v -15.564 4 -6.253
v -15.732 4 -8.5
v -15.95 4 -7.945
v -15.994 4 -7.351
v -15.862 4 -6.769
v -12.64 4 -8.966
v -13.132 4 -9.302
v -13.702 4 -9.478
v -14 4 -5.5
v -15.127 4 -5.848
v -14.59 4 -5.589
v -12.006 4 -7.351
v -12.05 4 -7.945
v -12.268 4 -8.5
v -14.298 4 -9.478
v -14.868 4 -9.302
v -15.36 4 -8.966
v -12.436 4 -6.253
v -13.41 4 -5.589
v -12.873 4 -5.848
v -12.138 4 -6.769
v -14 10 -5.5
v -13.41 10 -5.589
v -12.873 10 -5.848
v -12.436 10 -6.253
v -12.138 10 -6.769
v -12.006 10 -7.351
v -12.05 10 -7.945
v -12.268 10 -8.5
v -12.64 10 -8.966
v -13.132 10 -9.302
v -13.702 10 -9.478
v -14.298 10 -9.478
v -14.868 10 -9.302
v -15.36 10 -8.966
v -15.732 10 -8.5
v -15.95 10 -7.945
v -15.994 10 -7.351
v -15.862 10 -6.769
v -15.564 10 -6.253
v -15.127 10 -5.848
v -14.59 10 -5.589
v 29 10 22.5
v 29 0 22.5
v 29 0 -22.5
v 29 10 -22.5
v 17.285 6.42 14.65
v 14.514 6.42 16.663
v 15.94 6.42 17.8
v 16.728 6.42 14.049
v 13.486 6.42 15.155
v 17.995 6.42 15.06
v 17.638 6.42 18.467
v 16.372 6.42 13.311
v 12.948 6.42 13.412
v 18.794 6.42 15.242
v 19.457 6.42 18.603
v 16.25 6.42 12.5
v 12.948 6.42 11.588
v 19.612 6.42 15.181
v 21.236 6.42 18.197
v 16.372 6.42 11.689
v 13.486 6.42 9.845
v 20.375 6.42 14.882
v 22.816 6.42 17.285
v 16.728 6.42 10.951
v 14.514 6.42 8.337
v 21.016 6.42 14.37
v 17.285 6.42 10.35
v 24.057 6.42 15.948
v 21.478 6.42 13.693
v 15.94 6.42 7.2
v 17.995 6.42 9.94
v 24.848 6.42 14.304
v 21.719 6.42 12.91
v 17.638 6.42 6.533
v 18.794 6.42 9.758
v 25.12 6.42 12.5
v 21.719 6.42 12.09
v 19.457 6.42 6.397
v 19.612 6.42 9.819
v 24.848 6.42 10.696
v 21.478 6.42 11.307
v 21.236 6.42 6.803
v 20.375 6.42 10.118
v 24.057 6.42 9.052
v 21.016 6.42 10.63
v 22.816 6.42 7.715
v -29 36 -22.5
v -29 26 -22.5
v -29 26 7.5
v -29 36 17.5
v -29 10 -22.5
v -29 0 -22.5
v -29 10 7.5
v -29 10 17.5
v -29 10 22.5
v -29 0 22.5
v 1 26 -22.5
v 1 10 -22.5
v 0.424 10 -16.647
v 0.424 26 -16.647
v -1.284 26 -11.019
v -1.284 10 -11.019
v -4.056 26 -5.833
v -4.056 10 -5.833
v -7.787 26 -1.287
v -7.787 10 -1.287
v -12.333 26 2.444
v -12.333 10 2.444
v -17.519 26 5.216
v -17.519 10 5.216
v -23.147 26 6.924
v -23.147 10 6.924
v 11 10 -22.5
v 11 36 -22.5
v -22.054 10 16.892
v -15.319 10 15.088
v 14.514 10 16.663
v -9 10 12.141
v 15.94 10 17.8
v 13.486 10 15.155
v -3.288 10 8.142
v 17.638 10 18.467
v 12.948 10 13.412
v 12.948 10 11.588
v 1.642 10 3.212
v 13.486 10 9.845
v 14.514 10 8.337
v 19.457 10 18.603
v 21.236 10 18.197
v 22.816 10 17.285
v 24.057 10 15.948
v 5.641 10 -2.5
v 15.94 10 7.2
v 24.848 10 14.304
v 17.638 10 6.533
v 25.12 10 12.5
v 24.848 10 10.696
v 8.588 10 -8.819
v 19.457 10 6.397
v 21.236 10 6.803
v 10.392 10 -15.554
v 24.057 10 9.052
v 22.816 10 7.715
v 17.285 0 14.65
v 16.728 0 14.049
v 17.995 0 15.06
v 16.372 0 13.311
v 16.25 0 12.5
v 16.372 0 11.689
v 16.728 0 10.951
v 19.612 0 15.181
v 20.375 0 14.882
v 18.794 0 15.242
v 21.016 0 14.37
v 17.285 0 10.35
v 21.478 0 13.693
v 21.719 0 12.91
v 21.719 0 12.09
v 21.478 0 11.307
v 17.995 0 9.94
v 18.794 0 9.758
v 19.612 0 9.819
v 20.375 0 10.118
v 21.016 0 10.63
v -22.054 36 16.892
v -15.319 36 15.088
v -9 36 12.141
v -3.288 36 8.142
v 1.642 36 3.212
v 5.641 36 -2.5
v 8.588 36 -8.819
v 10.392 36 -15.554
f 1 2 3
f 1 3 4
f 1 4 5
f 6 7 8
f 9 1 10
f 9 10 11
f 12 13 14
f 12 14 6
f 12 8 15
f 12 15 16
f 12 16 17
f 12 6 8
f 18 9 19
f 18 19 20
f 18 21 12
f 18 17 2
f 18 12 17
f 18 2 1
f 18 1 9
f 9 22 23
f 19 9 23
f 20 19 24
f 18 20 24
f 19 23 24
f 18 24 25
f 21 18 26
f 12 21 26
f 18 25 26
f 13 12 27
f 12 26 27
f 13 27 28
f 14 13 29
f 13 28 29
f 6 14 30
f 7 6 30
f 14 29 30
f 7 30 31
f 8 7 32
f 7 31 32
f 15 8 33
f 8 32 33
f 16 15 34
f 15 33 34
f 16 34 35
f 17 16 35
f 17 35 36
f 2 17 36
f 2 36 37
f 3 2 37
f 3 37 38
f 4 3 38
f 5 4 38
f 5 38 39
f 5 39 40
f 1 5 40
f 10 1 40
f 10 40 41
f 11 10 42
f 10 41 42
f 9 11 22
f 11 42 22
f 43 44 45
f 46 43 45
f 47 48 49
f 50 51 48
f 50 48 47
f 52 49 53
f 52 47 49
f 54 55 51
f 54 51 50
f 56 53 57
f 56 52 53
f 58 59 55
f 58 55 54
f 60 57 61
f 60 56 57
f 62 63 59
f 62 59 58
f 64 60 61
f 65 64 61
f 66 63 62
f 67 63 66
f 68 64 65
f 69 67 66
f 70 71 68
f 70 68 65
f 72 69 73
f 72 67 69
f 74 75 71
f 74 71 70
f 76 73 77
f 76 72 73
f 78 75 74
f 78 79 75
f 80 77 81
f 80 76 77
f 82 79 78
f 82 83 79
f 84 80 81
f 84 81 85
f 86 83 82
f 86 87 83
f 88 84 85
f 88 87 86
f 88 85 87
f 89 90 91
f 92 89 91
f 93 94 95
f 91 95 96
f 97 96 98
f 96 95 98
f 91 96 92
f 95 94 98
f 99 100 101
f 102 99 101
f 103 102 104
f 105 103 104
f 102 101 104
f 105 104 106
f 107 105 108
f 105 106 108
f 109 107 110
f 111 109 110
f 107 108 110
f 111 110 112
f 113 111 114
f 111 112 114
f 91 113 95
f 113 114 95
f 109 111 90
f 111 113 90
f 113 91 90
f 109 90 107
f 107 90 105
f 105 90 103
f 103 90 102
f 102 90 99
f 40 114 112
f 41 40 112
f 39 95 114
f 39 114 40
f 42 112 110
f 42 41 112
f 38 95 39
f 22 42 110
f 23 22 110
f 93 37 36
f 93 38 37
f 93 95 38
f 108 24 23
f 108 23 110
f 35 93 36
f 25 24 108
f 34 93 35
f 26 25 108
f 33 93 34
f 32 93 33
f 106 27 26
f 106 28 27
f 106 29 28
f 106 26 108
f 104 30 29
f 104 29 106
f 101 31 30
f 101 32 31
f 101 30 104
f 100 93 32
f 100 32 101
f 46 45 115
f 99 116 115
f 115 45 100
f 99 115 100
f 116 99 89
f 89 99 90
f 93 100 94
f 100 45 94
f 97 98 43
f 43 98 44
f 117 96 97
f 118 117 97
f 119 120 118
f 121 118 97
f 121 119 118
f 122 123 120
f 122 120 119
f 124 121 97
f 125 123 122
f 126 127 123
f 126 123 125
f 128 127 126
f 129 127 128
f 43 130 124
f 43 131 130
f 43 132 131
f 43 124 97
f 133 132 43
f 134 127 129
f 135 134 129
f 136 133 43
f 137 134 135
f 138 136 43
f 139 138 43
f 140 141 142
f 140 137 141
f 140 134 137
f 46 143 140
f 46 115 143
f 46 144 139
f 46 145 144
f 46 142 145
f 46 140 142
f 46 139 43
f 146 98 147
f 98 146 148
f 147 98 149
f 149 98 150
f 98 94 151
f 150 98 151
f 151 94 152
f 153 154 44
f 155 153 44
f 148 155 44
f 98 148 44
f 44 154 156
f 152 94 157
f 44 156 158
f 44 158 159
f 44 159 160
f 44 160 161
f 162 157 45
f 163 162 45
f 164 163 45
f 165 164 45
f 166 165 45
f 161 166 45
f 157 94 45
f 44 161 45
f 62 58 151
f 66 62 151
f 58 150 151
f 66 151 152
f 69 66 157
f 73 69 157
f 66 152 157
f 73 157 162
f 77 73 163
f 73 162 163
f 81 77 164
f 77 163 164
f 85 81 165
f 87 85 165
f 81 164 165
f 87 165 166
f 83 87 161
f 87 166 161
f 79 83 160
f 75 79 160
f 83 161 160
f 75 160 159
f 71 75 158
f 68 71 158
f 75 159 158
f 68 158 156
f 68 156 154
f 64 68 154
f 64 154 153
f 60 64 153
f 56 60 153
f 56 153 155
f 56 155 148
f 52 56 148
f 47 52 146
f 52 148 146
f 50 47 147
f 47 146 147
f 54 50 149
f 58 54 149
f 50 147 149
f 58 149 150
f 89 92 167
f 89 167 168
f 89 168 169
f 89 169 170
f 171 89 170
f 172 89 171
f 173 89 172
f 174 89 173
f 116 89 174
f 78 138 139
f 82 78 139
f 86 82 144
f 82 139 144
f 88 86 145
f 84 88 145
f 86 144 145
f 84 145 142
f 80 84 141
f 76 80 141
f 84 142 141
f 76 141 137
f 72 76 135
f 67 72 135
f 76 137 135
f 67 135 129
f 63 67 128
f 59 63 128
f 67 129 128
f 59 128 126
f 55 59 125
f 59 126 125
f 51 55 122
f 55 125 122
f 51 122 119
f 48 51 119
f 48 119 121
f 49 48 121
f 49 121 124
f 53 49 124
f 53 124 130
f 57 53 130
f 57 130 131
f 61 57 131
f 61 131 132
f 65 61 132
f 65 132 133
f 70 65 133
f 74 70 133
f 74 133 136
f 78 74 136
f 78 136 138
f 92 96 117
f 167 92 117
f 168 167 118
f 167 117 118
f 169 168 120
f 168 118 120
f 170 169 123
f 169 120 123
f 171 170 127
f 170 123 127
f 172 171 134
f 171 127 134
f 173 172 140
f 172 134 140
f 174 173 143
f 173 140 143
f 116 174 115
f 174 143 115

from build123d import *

# Parameters (mm, degrees)
SKETCH3_W                               = 58
SKETCH3_H                               = 45
BOSS_EXTRUDE1_DEPTH                     = 10
CBORE_FOR_M5_HEX_HEAD_BOLT1_D           = 5.5
CBORE_FOR_M5_HEX_HEAD_BOLT1_CBORE_D     = 12.24
CBORE_FOR_M5_HEX_HEAD_BOLT1_CBORE_DEPTH = 3.58
BOSS_EXTRUDE3_DEPTH                     = 16
BOSS_EXTRUDE4_DEPTH                     = 10
SKETCH10_R                              = 2
CUT_EXTRUDE2_DEPTH                      = 6


with BuildPart() as part:
    # Sketch3 → Boss-Extrude1 (new body)
    with BuildSketch(Plane(origin=(0, 0, 0), x_dir=(1, 0, 0), z_dir=(0, 1, 0))):
        Rectangle(SKETCH3_W, SKETCH3_H)
    extrude(amount=BOSS_EXTRUDE1_DEPTH)

    # CBORE for M5 Hex Head Bolt1 (through all)
    with Locations(Plane(origin=(0, 10, 0), x_dir=(1, 0, 0), z_dir=(0, 1, 0))):
        with Locations((19, -12.5)):
            CounterBoreHole(CBORE_FOR_M5_HEX_HEAD_BOLT1_D / 2, CBORE_FOR_M5_HEX_HEAD_BOLT1_CBORE_D / 2, CBORE_FOR_M5_HEX_HEAD_BOLT1_CBORE_DEPTH)

    # Sketch8 → Boss-Extrude3 (add)
    with BuildSketch(Plane(origin=(0, 10, 0), x_dir=(1, 0, 0), z_dir=(0, 1, 0))):
        with BuildLine():
            Line((11, 22.5), (1, 22.5))
            ThreePointArc((1, 22.5), (-7.786796564, 1.286796564), (-29, -7.5))
            Line((-29, -7.5), (-29, -17.5))
            ThreePointArc((-29, -17.5), (-0.715728753, -5.784271247), (11, 22.5))
        make_face()
    extrude(amount=BOSS_EXTRUDE3_DEPTH)

    # Sketch9 → Boss-Extrude4 (add)
    with BuildSketch(Plane(origin=(0, 26, 0), x_dir=(1, 0, 0), z_dir=(0, 1, 0))):
        with BuildLine():
            Line((11, 22.5), (-29, 22.5))
            Line((-29, 22.5), (-29, -17.5))
            ThreePointArc((-29, -17.5), (-0.715728753, -5.784271247), (11, 22.5))
        make_face()
    extrude(amount=BOSS_EXTRUDE4_DEPTH)

    # Sketch10 → Cut-Extrude2 (cut)
    with BuildSketch(Plane(origin=(0, 10, 0), x_dir=(1, 0, 0), z_dir=(0, 1, 0))):
        with Locations(Location((-14, 7.5, 0), (0, 0, 270))):
            Circle(SKETCH10_R)
    extrude(amount=-CUT_EXTRUDE2_DEPTH, mode=Mode.SUBTRACT)


solid = part.part
